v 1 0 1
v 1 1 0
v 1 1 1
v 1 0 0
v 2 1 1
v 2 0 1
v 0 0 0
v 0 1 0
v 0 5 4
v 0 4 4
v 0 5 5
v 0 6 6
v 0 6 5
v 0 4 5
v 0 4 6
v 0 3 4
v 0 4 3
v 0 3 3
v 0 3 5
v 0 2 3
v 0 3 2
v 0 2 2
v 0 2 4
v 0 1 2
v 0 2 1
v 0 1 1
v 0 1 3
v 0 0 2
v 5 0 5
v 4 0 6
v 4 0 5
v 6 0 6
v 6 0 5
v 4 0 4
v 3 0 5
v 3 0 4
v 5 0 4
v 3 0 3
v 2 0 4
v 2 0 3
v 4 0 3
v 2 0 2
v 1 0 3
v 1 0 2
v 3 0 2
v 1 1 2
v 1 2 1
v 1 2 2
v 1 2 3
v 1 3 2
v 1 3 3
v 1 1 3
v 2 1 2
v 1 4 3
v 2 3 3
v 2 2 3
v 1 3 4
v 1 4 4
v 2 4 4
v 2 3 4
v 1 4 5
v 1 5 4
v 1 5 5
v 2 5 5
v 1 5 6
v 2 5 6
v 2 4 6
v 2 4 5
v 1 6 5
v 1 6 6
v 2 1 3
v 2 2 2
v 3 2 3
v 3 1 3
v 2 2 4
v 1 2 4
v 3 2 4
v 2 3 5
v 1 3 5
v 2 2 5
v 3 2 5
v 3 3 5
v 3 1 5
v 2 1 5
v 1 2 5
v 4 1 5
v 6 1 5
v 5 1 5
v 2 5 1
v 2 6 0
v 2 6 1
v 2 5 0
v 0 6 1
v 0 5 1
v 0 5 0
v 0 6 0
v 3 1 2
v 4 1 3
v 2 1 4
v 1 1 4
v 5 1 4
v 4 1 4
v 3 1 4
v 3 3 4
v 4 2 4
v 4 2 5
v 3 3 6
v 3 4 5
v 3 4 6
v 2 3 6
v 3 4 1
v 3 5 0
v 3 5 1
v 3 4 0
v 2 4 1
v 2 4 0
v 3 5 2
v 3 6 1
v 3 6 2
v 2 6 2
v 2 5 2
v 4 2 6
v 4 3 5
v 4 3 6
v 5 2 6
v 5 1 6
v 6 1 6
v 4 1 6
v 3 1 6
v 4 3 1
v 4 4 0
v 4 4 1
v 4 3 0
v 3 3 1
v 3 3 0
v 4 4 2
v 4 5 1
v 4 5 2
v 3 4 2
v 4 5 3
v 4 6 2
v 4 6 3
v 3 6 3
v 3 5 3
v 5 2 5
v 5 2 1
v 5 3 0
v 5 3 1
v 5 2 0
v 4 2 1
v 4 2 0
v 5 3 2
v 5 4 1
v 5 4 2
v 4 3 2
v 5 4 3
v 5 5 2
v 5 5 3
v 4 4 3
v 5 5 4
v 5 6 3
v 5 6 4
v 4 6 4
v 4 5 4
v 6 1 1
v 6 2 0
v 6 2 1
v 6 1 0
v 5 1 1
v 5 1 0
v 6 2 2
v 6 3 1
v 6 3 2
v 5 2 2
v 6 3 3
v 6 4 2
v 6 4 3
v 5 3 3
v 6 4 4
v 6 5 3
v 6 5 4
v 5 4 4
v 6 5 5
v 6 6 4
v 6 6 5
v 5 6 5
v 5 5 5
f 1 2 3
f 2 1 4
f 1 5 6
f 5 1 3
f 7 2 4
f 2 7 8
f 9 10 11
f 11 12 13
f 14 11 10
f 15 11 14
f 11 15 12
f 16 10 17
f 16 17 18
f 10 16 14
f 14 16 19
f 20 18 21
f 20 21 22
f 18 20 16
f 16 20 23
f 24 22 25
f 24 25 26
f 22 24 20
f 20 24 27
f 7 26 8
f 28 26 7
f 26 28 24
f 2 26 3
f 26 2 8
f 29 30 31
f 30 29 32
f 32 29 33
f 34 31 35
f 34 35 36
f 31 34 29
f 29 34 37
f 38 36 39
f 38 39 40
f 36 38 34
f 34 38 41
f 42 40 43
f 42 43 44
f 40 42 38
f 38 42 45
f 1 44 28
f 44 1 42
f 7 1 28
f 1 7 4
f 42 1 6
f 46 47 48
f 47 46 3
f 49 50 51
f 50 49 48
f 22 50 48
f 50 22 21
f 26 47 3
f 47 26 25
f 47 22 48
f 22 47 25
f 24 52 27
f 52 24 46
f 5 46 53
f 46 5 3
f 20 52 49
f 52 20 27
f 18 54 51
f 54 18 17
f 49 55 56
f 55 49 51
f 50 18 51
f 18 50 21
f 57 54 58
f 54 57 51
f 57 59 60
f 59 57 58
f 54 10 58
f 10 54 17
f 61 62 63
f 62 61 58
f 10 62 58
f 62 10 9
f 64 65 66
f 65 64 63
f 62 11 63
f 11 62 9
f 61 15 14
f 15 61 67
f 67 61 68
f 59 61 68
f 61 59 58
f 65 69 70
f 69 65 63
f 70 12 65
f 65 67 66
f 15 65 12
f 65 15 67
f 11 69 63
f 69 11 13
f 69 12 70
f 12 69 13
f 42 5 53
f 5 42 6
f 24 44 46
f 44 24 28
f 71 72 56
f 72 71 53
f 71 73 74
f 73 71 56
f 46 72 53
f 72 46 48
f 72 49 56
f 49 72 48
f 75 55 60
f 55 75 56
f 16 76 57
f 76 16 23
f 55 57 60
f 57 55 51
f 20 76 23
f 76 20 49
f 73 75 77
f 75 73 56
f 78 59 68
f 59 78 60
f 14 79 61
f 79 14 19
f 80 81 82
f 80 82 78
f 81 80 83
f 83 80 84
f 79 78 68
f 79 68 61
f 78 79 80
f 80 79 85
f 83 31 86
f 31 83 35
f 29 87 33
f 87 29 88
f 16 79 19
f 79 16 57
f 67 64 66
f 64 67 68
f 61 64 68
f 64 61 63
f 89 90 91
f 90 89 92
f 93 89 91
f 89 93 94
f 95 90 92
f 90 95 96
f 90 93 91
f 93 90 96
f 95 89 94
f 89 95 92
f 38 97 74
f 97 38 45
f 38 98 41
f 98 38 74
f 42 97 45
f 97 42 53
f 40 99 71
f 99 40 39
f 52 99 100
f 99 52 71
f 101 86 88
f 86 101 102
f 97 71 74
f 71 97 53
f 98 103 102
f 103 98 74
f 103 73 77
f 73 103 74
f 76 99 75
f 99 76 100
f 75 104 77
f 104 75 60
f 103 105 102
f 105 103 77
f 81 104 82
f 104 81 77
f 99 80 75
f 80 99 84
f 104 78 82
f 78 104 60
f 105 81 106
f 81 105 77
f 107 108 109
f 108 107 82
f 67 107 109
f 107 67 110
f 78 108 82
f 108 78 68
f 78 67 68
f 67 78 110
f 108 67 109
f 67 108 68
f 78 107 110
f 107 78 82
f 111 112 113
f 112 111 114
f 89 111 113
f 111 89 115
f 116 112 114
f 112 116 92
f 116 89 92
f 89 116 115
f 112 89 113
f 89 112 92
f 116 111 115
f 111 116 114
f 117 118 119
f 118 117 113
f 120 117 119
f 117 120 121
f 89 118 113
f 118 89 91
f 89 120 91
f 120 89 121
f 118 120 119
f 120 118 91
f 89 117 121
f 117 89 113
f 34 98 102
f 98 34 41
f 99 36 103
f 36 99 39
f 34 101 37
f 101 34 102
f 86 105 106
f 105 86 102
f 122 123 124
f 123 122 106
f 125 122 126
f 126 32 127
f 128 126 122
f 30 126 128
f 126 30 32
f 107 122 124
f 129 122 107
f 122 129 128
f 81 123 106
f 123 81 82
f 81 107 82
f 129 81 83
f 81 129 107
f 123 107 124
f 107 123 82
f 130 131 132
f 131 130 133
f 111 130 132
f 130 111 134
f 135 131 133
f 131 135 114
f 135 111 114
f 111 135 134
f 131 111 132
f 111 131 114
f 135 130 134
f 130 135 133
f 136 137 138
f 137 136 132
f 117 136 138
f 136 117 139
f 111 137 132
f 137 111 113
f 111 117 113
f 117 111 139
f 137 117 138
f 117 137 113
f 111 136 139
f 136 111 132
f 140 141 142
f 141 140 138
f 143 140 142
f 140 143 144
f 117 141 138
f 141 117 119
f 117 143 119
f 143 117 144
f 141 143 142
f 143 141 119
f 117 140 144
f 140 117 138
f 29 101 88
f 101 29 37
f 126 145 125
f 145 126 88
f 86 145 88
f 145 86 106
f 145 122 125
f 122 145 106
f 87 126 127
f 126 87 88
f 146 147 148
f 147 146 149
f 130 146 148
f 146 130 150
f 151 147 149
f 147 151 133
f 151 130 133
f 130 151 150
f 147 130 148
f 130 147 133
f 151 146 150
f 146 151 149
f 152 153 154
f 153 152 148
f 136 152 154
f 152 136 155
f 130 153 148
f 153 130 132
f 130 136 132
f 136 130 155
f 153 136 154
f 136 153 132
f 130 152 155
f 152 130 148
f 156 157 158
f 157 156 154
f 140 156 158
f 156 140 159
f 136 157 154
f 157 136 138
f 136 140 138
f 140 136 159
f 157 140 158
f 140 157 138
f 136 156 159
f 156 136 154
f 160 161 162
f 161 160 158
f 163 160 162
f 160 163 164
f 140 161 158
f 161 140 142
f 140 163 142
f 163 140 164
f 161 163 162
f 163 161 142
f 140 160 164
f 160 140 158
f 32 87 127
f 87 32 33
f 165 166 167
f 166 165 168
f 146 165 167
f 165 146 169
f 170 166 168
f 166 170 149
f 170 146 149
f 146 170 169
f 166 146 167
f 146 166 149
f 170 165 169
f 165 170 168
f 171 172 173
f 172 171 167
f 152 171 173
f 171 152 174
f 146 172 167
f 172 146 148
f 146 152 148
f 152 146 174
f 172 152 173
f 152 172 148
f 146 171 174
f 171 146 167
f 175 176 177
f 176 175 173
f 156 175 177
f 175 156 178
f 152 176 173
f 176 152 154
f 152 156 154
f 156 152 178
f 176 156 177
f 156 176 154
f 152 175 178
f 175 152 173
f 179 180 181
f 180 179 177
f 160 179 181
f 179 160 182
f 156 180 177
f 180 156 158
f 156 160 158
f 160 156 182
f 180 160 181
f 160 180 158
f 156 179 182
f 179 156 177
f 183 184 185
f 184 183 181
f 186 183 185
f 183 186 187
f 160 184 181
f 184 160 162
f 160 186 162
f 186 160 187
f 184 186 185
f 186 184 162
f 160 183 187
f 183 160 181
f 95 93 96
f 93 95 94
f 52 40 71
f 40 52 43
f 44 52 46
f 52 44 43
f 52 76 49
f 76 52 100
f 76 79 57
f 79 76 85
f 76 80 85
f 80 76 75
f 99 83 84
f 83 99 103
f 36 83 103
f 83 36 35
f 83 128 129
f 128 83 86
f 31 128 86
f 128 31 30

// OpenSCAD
union() {
    translate([0, 0, 0]) cube([1, 1, 1]);
    translate([0, 1, 1]) cube([1, 1, 1]);
    translate([0, 2, 2]) cube([1, 1, 1]);
    translate([0, 3, 3]) cube([1, 1, 1]);
    translate([0, 4, 4]) cube([1, 1, 1]);
    translate([0, 5, 5]) cube([1, 1, 1]);
    translate([1, 0, 1]) cube([1, 1, 1]);
    translate([1, 1, 2]) cube([1, 1, 1]);
    translate([1, 2, 3]) cube([1, 1, 1]);
    translate([1, 3, 4]) cube([1, 1, 1]);
    translate([1, 4, 5]) cube([1, 1, 1]);
    translate([1, 5, 0]) cube([1, 1, 1]);
    translate([2, 0, 2]) cube([1, 1, 1]);
    translate([2, 1, 3]) cube([1, 1, 1]);
    translate([2, 2, 4]) cube([1, 1, 1]);
    translate([2, 3, 5]) cube([1, 1, 1]);
    translate([2, 4, 0]) cube([1, 1, 1]);
    translate([2, 5, 1]) cube([1, 1, 1]);
    translate([3, 0, 3]) cube([1, 1, 1]);
    translate([3, 1, 4]) cube([1, 1, 1]);
    translate([3, 2, 5]) cube([1, 1, 1]);
    translate([3, 3, 0]) cube([1, 1, 1]);
    translate([3, 4, 1]) cube([1, 1, 1]);
    translate([3, 5, 2]) cube([1, 1, 1]);
    translate([4, 0, 4]) cube([1, 1, 1]);
    translate([4, 1, 5]) cube([1, 1, 1]);
    translate([4, 2, 0]) cube([1, 1, 1]);
    translate([4, 3, 1]) cube([1, 1, 1]);
    translate([4, 4, 2]) cube([1, 1, 1]);
    translate([4, 5, 3]) cube([1, 1, 1]);
    translate([5, 0, 5]) cube([1, 1, 1]);
    translate([5, 1, 0]) cube([1, 1, 1]);
    translate([5, 2, 1]) cube([1, 1, 1]);
    translate([5, 3, 2]) cube([1, 1, 1]);
    translate([5, 4, 3]) cube([1, 1, 1]);
    translate([5, 5, 4]) cube([1, 1, 1]);
    translate([0, 0, 1]) cube([1, 1, 1]);
    translate([0, 1, 2]) cube([1, 1, 1]);
    translate([0, 2, 3]) cube([1, 1, 1]);
    translate([0, 3, 4]) cube([1, 1, 1]);
    translate([0, 4, 5]) cube([1, 1, 1]);
    translate([0, 5, 0]) cube([1, 1, 1]);
    translate([1, 0, 2]) cube([1, 1, 1]);
    translate([1, 1, 3]) cube([1, 1, 1]);
    translate([1, 2, 4]) cube([1, 1, 1]);
    translate([2, 0, 3]) cube([1, 1, 1]);
    translate([2, 1, 4]) cube([1, 1, 1]);
    translate([3, 0, 4]) cube([1, 1, 1]);
    translate([3, 1, 5]) cube([1, 1, 1]);
    translate([4, 0, 5]) cube([1, 1, 1]);
}
